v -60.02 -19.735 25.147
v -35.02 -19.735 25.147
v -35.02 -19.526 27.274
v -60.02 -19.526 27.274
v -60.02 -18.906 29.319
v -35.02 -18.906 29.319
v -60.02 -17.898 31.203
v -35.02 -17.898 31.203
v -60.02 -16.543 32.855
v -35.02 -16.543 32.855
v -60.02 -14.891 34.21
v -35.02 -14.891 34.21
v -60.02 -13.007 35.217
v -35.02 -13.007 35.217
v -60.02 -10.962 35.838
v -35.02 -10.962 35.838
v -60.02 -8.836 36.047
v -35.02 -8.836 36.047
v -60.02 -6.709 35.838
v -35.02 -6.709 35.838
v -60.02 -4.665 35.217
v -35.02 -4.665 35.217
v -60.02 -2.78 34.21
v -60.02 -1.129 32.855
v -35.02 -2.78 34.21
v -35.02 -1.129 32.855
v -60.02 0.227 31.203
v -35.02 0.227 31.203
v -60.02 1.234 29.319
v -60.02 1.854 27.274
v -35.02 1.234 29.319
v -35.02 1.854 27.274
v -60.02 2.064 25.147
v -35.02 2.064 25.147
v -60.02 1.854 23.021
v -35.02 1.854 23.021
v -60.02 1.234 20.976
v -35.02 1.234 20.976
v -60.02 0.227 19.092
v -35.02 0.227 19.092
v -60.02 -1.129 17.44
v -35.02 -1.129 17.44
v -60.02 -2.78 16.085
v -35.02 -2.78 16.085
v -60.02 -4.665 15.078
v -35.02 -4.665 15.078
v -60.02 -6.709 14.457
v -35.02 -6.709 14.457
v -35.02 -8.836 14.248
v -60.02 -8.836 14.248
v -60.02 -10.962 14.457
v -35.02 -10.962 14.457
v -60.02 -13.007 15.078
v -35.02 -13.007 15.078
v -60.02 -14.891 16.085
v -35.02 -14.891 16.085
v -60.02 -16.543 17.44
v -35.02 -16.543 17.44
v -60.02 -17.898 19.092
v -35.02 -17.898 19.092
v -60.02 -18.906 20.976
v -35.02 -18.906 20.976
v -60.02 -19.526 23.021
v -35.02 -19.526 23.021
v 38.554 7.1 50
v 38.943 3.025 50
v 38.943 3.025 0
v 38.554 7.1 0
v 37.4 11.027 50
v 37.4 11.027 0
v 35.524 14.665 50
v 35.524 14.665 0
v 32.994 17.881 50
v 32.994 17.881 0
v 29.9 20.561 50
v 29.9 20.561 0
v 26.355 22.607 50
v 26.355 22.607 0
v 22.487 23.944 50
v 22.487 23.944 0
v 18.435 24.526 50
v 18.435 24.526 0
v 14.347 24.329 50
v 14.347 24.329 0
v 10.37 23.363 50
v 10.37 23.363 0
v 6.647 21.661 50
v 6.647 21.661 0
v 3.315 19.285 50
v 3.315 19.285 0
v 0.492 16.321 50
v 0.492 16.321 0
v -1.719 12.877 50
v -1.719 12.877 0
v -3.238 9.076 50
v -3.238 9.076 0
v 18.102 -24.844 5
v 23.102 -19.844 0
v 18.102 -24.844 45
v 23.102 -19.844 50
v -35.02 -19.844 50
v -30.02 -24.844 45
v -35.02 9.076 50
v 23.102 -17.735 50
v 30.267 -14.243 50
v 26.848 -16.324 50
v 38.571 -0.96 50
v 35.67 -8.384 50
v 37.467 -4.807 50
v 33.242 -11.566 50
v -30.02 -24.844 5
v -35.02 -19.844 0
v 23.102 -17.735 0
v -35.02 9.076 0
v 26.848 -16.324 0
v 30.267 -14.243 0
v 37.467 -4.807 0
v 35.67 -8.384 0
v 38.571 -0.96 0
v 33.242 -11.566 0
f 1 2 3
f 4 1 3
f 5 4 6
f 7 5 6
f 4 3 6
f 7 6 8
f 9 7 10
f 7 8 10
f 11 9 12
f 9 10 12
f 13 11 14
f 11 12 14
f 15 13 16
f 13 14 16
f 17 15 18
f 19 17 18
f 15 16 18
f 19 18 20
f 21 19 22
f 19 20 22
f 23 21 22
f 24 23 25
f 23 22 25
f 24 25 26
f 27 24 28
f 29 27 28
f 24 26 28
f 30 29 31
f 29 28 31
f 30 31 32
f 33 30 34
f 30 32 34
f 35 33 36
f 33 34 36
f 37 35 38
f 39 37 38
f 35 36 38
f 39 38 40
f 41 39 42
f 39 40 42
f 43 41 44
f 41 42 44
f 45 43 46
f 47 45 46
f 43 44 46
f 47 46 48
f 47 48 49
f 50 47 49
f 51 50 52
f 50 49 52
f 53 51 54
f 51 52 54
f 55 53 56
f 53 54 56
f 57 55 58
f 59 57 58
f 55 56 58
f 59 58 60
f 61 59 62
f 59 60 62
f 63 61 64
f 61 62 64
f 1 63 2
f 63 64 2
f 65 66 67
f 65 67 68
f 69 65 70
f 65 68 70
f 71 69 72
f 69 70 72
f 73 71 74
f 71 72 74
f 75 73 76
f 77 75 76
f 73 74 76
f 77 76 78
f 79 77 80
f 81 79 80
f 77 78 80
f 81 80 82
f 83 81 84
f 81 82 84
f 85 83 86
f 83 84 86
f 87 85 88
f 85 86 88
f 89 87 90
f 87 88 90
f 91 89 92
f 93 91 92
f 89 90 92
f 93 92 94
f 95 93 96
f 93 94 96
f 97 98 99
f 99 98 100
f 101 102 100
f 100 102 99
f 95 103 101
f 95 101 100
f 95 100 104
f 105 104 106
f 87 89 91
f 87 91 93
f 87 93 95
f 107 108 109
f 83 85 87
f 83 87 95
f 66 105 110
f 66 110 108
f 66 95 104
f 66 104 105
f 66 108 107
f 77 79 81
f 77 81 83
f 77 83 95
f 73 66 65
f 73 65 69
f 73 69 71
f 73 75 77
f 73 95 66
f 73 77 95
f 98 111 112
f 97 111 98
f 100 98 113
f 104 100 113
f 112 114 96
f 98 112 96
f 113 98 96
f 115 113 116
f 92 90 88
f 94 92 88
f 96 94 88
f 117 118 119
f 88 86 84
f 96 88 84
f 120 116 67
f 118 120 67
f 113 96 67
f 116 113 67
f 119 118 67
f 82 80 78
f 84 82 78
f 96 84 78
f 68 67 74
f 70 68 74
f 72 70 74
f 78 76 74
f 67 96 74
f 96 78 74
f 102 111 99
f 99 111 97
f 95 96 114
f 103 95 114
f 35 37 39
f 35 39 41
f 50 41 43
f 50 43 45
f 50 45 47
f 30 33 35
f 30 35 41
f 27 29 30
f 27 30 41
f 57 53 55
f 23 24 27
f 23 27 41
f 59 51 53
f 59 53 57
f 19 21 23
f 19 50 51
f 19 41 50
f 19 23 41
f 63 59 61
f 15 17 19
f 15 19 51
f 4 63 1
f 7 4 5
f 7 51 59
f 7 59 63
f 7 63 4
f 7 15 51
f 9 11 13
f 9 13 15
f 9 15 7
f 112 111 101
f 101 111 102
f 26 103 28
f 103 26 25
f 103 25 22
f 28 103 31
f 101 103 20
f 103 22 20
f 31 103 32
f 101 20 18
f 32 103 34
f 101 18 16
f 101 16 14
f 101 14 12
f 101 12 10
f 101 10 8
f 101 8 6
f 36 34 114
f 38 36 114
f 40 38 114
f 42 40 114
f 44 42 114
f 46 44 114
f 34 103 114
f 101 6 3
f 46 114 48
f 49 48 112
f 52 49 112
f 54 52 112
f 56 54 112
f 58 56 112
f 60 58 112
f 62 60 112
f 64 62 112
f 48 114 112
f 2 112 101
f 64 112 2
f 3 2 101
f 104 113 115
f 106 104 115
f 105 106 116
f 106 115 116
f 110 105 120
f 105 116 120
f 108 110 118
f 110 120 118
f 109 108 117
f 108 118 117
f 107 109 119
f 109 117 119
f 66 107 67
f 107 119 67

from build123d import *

# Parameters (mm, degrees)
F1_DEPTH = 50
F2_R     = 10.899508
F3_DEPTH = 25
F4_SIZE  = 5


with BuildPart() as f1:
    # F0 (on Top) → F1 (new body)
    with BuildSketch(Plane.XY):
        with BuildLine():
            Line((-35.020374, 9.075959), (-35.020374, -24.844296))
            Line((-35.020374, -24.844296), (23.102446, -24.844296))
            Line((23.102446, -24.844296), (23.102446, -17.734874))
            ThreePointArc((23.102446, -17.734874), (2.064421, -12.059264), (-3.237784, 9.075959))
            Line((-3.237784, 9.075959), (-35.020374, 9.075959))
        make_face()
        with BuildLine():
            Line((23.102446, 9.075959), (23.102446, -17.734874))
            ThreePointArc((23.102446, -17.734874), (34.530424, -10.031296), (38.942748, 3.02532))
            ThreePointArc((38.942748, 3.02532), (20.474798, 24.331467), (-3.237784, 9.075959))
            Line((-3.237784, 9.075959), (23.102446, 9.075959))
        make_face()
        with BuildLine():
            ThreePointArc((-3.237784, 9.075959), (2.064421, -12.059264), (23.102446, -17.734874))
            Line((23.102446, -17.734874), (23.102446, 9.075959))
            Line((23.102446, 9.075959), (-3.237784, 9.075959))
        make_face()
    extrude(amount=F1_DEPTH)

    # F2 (on face) → F3 (join)
    with BuildSketch(Plane(origin=(-35.020374, 0, 0), x_dir=(0, -1, 0), z_dir=(-1, 0, 0))):
        with Locations((8.835716, 25.147455)):
            Circle(F2_R)
    extrude(amount=F3_DEPTH)

    # F4
    f4_edges = [f1.edges().sort_by_distance(p)[0] for p in [
        (23.102446, -24.844296, 25),
        (-35.020374, -24.844296, 25),
        (-5.958964, -24.844296, 0),
        (-5.958964, -24.844296, 50),
    ]]
    chamfer(f4_edges, length=F4_SIZE)


solid = f1.part
